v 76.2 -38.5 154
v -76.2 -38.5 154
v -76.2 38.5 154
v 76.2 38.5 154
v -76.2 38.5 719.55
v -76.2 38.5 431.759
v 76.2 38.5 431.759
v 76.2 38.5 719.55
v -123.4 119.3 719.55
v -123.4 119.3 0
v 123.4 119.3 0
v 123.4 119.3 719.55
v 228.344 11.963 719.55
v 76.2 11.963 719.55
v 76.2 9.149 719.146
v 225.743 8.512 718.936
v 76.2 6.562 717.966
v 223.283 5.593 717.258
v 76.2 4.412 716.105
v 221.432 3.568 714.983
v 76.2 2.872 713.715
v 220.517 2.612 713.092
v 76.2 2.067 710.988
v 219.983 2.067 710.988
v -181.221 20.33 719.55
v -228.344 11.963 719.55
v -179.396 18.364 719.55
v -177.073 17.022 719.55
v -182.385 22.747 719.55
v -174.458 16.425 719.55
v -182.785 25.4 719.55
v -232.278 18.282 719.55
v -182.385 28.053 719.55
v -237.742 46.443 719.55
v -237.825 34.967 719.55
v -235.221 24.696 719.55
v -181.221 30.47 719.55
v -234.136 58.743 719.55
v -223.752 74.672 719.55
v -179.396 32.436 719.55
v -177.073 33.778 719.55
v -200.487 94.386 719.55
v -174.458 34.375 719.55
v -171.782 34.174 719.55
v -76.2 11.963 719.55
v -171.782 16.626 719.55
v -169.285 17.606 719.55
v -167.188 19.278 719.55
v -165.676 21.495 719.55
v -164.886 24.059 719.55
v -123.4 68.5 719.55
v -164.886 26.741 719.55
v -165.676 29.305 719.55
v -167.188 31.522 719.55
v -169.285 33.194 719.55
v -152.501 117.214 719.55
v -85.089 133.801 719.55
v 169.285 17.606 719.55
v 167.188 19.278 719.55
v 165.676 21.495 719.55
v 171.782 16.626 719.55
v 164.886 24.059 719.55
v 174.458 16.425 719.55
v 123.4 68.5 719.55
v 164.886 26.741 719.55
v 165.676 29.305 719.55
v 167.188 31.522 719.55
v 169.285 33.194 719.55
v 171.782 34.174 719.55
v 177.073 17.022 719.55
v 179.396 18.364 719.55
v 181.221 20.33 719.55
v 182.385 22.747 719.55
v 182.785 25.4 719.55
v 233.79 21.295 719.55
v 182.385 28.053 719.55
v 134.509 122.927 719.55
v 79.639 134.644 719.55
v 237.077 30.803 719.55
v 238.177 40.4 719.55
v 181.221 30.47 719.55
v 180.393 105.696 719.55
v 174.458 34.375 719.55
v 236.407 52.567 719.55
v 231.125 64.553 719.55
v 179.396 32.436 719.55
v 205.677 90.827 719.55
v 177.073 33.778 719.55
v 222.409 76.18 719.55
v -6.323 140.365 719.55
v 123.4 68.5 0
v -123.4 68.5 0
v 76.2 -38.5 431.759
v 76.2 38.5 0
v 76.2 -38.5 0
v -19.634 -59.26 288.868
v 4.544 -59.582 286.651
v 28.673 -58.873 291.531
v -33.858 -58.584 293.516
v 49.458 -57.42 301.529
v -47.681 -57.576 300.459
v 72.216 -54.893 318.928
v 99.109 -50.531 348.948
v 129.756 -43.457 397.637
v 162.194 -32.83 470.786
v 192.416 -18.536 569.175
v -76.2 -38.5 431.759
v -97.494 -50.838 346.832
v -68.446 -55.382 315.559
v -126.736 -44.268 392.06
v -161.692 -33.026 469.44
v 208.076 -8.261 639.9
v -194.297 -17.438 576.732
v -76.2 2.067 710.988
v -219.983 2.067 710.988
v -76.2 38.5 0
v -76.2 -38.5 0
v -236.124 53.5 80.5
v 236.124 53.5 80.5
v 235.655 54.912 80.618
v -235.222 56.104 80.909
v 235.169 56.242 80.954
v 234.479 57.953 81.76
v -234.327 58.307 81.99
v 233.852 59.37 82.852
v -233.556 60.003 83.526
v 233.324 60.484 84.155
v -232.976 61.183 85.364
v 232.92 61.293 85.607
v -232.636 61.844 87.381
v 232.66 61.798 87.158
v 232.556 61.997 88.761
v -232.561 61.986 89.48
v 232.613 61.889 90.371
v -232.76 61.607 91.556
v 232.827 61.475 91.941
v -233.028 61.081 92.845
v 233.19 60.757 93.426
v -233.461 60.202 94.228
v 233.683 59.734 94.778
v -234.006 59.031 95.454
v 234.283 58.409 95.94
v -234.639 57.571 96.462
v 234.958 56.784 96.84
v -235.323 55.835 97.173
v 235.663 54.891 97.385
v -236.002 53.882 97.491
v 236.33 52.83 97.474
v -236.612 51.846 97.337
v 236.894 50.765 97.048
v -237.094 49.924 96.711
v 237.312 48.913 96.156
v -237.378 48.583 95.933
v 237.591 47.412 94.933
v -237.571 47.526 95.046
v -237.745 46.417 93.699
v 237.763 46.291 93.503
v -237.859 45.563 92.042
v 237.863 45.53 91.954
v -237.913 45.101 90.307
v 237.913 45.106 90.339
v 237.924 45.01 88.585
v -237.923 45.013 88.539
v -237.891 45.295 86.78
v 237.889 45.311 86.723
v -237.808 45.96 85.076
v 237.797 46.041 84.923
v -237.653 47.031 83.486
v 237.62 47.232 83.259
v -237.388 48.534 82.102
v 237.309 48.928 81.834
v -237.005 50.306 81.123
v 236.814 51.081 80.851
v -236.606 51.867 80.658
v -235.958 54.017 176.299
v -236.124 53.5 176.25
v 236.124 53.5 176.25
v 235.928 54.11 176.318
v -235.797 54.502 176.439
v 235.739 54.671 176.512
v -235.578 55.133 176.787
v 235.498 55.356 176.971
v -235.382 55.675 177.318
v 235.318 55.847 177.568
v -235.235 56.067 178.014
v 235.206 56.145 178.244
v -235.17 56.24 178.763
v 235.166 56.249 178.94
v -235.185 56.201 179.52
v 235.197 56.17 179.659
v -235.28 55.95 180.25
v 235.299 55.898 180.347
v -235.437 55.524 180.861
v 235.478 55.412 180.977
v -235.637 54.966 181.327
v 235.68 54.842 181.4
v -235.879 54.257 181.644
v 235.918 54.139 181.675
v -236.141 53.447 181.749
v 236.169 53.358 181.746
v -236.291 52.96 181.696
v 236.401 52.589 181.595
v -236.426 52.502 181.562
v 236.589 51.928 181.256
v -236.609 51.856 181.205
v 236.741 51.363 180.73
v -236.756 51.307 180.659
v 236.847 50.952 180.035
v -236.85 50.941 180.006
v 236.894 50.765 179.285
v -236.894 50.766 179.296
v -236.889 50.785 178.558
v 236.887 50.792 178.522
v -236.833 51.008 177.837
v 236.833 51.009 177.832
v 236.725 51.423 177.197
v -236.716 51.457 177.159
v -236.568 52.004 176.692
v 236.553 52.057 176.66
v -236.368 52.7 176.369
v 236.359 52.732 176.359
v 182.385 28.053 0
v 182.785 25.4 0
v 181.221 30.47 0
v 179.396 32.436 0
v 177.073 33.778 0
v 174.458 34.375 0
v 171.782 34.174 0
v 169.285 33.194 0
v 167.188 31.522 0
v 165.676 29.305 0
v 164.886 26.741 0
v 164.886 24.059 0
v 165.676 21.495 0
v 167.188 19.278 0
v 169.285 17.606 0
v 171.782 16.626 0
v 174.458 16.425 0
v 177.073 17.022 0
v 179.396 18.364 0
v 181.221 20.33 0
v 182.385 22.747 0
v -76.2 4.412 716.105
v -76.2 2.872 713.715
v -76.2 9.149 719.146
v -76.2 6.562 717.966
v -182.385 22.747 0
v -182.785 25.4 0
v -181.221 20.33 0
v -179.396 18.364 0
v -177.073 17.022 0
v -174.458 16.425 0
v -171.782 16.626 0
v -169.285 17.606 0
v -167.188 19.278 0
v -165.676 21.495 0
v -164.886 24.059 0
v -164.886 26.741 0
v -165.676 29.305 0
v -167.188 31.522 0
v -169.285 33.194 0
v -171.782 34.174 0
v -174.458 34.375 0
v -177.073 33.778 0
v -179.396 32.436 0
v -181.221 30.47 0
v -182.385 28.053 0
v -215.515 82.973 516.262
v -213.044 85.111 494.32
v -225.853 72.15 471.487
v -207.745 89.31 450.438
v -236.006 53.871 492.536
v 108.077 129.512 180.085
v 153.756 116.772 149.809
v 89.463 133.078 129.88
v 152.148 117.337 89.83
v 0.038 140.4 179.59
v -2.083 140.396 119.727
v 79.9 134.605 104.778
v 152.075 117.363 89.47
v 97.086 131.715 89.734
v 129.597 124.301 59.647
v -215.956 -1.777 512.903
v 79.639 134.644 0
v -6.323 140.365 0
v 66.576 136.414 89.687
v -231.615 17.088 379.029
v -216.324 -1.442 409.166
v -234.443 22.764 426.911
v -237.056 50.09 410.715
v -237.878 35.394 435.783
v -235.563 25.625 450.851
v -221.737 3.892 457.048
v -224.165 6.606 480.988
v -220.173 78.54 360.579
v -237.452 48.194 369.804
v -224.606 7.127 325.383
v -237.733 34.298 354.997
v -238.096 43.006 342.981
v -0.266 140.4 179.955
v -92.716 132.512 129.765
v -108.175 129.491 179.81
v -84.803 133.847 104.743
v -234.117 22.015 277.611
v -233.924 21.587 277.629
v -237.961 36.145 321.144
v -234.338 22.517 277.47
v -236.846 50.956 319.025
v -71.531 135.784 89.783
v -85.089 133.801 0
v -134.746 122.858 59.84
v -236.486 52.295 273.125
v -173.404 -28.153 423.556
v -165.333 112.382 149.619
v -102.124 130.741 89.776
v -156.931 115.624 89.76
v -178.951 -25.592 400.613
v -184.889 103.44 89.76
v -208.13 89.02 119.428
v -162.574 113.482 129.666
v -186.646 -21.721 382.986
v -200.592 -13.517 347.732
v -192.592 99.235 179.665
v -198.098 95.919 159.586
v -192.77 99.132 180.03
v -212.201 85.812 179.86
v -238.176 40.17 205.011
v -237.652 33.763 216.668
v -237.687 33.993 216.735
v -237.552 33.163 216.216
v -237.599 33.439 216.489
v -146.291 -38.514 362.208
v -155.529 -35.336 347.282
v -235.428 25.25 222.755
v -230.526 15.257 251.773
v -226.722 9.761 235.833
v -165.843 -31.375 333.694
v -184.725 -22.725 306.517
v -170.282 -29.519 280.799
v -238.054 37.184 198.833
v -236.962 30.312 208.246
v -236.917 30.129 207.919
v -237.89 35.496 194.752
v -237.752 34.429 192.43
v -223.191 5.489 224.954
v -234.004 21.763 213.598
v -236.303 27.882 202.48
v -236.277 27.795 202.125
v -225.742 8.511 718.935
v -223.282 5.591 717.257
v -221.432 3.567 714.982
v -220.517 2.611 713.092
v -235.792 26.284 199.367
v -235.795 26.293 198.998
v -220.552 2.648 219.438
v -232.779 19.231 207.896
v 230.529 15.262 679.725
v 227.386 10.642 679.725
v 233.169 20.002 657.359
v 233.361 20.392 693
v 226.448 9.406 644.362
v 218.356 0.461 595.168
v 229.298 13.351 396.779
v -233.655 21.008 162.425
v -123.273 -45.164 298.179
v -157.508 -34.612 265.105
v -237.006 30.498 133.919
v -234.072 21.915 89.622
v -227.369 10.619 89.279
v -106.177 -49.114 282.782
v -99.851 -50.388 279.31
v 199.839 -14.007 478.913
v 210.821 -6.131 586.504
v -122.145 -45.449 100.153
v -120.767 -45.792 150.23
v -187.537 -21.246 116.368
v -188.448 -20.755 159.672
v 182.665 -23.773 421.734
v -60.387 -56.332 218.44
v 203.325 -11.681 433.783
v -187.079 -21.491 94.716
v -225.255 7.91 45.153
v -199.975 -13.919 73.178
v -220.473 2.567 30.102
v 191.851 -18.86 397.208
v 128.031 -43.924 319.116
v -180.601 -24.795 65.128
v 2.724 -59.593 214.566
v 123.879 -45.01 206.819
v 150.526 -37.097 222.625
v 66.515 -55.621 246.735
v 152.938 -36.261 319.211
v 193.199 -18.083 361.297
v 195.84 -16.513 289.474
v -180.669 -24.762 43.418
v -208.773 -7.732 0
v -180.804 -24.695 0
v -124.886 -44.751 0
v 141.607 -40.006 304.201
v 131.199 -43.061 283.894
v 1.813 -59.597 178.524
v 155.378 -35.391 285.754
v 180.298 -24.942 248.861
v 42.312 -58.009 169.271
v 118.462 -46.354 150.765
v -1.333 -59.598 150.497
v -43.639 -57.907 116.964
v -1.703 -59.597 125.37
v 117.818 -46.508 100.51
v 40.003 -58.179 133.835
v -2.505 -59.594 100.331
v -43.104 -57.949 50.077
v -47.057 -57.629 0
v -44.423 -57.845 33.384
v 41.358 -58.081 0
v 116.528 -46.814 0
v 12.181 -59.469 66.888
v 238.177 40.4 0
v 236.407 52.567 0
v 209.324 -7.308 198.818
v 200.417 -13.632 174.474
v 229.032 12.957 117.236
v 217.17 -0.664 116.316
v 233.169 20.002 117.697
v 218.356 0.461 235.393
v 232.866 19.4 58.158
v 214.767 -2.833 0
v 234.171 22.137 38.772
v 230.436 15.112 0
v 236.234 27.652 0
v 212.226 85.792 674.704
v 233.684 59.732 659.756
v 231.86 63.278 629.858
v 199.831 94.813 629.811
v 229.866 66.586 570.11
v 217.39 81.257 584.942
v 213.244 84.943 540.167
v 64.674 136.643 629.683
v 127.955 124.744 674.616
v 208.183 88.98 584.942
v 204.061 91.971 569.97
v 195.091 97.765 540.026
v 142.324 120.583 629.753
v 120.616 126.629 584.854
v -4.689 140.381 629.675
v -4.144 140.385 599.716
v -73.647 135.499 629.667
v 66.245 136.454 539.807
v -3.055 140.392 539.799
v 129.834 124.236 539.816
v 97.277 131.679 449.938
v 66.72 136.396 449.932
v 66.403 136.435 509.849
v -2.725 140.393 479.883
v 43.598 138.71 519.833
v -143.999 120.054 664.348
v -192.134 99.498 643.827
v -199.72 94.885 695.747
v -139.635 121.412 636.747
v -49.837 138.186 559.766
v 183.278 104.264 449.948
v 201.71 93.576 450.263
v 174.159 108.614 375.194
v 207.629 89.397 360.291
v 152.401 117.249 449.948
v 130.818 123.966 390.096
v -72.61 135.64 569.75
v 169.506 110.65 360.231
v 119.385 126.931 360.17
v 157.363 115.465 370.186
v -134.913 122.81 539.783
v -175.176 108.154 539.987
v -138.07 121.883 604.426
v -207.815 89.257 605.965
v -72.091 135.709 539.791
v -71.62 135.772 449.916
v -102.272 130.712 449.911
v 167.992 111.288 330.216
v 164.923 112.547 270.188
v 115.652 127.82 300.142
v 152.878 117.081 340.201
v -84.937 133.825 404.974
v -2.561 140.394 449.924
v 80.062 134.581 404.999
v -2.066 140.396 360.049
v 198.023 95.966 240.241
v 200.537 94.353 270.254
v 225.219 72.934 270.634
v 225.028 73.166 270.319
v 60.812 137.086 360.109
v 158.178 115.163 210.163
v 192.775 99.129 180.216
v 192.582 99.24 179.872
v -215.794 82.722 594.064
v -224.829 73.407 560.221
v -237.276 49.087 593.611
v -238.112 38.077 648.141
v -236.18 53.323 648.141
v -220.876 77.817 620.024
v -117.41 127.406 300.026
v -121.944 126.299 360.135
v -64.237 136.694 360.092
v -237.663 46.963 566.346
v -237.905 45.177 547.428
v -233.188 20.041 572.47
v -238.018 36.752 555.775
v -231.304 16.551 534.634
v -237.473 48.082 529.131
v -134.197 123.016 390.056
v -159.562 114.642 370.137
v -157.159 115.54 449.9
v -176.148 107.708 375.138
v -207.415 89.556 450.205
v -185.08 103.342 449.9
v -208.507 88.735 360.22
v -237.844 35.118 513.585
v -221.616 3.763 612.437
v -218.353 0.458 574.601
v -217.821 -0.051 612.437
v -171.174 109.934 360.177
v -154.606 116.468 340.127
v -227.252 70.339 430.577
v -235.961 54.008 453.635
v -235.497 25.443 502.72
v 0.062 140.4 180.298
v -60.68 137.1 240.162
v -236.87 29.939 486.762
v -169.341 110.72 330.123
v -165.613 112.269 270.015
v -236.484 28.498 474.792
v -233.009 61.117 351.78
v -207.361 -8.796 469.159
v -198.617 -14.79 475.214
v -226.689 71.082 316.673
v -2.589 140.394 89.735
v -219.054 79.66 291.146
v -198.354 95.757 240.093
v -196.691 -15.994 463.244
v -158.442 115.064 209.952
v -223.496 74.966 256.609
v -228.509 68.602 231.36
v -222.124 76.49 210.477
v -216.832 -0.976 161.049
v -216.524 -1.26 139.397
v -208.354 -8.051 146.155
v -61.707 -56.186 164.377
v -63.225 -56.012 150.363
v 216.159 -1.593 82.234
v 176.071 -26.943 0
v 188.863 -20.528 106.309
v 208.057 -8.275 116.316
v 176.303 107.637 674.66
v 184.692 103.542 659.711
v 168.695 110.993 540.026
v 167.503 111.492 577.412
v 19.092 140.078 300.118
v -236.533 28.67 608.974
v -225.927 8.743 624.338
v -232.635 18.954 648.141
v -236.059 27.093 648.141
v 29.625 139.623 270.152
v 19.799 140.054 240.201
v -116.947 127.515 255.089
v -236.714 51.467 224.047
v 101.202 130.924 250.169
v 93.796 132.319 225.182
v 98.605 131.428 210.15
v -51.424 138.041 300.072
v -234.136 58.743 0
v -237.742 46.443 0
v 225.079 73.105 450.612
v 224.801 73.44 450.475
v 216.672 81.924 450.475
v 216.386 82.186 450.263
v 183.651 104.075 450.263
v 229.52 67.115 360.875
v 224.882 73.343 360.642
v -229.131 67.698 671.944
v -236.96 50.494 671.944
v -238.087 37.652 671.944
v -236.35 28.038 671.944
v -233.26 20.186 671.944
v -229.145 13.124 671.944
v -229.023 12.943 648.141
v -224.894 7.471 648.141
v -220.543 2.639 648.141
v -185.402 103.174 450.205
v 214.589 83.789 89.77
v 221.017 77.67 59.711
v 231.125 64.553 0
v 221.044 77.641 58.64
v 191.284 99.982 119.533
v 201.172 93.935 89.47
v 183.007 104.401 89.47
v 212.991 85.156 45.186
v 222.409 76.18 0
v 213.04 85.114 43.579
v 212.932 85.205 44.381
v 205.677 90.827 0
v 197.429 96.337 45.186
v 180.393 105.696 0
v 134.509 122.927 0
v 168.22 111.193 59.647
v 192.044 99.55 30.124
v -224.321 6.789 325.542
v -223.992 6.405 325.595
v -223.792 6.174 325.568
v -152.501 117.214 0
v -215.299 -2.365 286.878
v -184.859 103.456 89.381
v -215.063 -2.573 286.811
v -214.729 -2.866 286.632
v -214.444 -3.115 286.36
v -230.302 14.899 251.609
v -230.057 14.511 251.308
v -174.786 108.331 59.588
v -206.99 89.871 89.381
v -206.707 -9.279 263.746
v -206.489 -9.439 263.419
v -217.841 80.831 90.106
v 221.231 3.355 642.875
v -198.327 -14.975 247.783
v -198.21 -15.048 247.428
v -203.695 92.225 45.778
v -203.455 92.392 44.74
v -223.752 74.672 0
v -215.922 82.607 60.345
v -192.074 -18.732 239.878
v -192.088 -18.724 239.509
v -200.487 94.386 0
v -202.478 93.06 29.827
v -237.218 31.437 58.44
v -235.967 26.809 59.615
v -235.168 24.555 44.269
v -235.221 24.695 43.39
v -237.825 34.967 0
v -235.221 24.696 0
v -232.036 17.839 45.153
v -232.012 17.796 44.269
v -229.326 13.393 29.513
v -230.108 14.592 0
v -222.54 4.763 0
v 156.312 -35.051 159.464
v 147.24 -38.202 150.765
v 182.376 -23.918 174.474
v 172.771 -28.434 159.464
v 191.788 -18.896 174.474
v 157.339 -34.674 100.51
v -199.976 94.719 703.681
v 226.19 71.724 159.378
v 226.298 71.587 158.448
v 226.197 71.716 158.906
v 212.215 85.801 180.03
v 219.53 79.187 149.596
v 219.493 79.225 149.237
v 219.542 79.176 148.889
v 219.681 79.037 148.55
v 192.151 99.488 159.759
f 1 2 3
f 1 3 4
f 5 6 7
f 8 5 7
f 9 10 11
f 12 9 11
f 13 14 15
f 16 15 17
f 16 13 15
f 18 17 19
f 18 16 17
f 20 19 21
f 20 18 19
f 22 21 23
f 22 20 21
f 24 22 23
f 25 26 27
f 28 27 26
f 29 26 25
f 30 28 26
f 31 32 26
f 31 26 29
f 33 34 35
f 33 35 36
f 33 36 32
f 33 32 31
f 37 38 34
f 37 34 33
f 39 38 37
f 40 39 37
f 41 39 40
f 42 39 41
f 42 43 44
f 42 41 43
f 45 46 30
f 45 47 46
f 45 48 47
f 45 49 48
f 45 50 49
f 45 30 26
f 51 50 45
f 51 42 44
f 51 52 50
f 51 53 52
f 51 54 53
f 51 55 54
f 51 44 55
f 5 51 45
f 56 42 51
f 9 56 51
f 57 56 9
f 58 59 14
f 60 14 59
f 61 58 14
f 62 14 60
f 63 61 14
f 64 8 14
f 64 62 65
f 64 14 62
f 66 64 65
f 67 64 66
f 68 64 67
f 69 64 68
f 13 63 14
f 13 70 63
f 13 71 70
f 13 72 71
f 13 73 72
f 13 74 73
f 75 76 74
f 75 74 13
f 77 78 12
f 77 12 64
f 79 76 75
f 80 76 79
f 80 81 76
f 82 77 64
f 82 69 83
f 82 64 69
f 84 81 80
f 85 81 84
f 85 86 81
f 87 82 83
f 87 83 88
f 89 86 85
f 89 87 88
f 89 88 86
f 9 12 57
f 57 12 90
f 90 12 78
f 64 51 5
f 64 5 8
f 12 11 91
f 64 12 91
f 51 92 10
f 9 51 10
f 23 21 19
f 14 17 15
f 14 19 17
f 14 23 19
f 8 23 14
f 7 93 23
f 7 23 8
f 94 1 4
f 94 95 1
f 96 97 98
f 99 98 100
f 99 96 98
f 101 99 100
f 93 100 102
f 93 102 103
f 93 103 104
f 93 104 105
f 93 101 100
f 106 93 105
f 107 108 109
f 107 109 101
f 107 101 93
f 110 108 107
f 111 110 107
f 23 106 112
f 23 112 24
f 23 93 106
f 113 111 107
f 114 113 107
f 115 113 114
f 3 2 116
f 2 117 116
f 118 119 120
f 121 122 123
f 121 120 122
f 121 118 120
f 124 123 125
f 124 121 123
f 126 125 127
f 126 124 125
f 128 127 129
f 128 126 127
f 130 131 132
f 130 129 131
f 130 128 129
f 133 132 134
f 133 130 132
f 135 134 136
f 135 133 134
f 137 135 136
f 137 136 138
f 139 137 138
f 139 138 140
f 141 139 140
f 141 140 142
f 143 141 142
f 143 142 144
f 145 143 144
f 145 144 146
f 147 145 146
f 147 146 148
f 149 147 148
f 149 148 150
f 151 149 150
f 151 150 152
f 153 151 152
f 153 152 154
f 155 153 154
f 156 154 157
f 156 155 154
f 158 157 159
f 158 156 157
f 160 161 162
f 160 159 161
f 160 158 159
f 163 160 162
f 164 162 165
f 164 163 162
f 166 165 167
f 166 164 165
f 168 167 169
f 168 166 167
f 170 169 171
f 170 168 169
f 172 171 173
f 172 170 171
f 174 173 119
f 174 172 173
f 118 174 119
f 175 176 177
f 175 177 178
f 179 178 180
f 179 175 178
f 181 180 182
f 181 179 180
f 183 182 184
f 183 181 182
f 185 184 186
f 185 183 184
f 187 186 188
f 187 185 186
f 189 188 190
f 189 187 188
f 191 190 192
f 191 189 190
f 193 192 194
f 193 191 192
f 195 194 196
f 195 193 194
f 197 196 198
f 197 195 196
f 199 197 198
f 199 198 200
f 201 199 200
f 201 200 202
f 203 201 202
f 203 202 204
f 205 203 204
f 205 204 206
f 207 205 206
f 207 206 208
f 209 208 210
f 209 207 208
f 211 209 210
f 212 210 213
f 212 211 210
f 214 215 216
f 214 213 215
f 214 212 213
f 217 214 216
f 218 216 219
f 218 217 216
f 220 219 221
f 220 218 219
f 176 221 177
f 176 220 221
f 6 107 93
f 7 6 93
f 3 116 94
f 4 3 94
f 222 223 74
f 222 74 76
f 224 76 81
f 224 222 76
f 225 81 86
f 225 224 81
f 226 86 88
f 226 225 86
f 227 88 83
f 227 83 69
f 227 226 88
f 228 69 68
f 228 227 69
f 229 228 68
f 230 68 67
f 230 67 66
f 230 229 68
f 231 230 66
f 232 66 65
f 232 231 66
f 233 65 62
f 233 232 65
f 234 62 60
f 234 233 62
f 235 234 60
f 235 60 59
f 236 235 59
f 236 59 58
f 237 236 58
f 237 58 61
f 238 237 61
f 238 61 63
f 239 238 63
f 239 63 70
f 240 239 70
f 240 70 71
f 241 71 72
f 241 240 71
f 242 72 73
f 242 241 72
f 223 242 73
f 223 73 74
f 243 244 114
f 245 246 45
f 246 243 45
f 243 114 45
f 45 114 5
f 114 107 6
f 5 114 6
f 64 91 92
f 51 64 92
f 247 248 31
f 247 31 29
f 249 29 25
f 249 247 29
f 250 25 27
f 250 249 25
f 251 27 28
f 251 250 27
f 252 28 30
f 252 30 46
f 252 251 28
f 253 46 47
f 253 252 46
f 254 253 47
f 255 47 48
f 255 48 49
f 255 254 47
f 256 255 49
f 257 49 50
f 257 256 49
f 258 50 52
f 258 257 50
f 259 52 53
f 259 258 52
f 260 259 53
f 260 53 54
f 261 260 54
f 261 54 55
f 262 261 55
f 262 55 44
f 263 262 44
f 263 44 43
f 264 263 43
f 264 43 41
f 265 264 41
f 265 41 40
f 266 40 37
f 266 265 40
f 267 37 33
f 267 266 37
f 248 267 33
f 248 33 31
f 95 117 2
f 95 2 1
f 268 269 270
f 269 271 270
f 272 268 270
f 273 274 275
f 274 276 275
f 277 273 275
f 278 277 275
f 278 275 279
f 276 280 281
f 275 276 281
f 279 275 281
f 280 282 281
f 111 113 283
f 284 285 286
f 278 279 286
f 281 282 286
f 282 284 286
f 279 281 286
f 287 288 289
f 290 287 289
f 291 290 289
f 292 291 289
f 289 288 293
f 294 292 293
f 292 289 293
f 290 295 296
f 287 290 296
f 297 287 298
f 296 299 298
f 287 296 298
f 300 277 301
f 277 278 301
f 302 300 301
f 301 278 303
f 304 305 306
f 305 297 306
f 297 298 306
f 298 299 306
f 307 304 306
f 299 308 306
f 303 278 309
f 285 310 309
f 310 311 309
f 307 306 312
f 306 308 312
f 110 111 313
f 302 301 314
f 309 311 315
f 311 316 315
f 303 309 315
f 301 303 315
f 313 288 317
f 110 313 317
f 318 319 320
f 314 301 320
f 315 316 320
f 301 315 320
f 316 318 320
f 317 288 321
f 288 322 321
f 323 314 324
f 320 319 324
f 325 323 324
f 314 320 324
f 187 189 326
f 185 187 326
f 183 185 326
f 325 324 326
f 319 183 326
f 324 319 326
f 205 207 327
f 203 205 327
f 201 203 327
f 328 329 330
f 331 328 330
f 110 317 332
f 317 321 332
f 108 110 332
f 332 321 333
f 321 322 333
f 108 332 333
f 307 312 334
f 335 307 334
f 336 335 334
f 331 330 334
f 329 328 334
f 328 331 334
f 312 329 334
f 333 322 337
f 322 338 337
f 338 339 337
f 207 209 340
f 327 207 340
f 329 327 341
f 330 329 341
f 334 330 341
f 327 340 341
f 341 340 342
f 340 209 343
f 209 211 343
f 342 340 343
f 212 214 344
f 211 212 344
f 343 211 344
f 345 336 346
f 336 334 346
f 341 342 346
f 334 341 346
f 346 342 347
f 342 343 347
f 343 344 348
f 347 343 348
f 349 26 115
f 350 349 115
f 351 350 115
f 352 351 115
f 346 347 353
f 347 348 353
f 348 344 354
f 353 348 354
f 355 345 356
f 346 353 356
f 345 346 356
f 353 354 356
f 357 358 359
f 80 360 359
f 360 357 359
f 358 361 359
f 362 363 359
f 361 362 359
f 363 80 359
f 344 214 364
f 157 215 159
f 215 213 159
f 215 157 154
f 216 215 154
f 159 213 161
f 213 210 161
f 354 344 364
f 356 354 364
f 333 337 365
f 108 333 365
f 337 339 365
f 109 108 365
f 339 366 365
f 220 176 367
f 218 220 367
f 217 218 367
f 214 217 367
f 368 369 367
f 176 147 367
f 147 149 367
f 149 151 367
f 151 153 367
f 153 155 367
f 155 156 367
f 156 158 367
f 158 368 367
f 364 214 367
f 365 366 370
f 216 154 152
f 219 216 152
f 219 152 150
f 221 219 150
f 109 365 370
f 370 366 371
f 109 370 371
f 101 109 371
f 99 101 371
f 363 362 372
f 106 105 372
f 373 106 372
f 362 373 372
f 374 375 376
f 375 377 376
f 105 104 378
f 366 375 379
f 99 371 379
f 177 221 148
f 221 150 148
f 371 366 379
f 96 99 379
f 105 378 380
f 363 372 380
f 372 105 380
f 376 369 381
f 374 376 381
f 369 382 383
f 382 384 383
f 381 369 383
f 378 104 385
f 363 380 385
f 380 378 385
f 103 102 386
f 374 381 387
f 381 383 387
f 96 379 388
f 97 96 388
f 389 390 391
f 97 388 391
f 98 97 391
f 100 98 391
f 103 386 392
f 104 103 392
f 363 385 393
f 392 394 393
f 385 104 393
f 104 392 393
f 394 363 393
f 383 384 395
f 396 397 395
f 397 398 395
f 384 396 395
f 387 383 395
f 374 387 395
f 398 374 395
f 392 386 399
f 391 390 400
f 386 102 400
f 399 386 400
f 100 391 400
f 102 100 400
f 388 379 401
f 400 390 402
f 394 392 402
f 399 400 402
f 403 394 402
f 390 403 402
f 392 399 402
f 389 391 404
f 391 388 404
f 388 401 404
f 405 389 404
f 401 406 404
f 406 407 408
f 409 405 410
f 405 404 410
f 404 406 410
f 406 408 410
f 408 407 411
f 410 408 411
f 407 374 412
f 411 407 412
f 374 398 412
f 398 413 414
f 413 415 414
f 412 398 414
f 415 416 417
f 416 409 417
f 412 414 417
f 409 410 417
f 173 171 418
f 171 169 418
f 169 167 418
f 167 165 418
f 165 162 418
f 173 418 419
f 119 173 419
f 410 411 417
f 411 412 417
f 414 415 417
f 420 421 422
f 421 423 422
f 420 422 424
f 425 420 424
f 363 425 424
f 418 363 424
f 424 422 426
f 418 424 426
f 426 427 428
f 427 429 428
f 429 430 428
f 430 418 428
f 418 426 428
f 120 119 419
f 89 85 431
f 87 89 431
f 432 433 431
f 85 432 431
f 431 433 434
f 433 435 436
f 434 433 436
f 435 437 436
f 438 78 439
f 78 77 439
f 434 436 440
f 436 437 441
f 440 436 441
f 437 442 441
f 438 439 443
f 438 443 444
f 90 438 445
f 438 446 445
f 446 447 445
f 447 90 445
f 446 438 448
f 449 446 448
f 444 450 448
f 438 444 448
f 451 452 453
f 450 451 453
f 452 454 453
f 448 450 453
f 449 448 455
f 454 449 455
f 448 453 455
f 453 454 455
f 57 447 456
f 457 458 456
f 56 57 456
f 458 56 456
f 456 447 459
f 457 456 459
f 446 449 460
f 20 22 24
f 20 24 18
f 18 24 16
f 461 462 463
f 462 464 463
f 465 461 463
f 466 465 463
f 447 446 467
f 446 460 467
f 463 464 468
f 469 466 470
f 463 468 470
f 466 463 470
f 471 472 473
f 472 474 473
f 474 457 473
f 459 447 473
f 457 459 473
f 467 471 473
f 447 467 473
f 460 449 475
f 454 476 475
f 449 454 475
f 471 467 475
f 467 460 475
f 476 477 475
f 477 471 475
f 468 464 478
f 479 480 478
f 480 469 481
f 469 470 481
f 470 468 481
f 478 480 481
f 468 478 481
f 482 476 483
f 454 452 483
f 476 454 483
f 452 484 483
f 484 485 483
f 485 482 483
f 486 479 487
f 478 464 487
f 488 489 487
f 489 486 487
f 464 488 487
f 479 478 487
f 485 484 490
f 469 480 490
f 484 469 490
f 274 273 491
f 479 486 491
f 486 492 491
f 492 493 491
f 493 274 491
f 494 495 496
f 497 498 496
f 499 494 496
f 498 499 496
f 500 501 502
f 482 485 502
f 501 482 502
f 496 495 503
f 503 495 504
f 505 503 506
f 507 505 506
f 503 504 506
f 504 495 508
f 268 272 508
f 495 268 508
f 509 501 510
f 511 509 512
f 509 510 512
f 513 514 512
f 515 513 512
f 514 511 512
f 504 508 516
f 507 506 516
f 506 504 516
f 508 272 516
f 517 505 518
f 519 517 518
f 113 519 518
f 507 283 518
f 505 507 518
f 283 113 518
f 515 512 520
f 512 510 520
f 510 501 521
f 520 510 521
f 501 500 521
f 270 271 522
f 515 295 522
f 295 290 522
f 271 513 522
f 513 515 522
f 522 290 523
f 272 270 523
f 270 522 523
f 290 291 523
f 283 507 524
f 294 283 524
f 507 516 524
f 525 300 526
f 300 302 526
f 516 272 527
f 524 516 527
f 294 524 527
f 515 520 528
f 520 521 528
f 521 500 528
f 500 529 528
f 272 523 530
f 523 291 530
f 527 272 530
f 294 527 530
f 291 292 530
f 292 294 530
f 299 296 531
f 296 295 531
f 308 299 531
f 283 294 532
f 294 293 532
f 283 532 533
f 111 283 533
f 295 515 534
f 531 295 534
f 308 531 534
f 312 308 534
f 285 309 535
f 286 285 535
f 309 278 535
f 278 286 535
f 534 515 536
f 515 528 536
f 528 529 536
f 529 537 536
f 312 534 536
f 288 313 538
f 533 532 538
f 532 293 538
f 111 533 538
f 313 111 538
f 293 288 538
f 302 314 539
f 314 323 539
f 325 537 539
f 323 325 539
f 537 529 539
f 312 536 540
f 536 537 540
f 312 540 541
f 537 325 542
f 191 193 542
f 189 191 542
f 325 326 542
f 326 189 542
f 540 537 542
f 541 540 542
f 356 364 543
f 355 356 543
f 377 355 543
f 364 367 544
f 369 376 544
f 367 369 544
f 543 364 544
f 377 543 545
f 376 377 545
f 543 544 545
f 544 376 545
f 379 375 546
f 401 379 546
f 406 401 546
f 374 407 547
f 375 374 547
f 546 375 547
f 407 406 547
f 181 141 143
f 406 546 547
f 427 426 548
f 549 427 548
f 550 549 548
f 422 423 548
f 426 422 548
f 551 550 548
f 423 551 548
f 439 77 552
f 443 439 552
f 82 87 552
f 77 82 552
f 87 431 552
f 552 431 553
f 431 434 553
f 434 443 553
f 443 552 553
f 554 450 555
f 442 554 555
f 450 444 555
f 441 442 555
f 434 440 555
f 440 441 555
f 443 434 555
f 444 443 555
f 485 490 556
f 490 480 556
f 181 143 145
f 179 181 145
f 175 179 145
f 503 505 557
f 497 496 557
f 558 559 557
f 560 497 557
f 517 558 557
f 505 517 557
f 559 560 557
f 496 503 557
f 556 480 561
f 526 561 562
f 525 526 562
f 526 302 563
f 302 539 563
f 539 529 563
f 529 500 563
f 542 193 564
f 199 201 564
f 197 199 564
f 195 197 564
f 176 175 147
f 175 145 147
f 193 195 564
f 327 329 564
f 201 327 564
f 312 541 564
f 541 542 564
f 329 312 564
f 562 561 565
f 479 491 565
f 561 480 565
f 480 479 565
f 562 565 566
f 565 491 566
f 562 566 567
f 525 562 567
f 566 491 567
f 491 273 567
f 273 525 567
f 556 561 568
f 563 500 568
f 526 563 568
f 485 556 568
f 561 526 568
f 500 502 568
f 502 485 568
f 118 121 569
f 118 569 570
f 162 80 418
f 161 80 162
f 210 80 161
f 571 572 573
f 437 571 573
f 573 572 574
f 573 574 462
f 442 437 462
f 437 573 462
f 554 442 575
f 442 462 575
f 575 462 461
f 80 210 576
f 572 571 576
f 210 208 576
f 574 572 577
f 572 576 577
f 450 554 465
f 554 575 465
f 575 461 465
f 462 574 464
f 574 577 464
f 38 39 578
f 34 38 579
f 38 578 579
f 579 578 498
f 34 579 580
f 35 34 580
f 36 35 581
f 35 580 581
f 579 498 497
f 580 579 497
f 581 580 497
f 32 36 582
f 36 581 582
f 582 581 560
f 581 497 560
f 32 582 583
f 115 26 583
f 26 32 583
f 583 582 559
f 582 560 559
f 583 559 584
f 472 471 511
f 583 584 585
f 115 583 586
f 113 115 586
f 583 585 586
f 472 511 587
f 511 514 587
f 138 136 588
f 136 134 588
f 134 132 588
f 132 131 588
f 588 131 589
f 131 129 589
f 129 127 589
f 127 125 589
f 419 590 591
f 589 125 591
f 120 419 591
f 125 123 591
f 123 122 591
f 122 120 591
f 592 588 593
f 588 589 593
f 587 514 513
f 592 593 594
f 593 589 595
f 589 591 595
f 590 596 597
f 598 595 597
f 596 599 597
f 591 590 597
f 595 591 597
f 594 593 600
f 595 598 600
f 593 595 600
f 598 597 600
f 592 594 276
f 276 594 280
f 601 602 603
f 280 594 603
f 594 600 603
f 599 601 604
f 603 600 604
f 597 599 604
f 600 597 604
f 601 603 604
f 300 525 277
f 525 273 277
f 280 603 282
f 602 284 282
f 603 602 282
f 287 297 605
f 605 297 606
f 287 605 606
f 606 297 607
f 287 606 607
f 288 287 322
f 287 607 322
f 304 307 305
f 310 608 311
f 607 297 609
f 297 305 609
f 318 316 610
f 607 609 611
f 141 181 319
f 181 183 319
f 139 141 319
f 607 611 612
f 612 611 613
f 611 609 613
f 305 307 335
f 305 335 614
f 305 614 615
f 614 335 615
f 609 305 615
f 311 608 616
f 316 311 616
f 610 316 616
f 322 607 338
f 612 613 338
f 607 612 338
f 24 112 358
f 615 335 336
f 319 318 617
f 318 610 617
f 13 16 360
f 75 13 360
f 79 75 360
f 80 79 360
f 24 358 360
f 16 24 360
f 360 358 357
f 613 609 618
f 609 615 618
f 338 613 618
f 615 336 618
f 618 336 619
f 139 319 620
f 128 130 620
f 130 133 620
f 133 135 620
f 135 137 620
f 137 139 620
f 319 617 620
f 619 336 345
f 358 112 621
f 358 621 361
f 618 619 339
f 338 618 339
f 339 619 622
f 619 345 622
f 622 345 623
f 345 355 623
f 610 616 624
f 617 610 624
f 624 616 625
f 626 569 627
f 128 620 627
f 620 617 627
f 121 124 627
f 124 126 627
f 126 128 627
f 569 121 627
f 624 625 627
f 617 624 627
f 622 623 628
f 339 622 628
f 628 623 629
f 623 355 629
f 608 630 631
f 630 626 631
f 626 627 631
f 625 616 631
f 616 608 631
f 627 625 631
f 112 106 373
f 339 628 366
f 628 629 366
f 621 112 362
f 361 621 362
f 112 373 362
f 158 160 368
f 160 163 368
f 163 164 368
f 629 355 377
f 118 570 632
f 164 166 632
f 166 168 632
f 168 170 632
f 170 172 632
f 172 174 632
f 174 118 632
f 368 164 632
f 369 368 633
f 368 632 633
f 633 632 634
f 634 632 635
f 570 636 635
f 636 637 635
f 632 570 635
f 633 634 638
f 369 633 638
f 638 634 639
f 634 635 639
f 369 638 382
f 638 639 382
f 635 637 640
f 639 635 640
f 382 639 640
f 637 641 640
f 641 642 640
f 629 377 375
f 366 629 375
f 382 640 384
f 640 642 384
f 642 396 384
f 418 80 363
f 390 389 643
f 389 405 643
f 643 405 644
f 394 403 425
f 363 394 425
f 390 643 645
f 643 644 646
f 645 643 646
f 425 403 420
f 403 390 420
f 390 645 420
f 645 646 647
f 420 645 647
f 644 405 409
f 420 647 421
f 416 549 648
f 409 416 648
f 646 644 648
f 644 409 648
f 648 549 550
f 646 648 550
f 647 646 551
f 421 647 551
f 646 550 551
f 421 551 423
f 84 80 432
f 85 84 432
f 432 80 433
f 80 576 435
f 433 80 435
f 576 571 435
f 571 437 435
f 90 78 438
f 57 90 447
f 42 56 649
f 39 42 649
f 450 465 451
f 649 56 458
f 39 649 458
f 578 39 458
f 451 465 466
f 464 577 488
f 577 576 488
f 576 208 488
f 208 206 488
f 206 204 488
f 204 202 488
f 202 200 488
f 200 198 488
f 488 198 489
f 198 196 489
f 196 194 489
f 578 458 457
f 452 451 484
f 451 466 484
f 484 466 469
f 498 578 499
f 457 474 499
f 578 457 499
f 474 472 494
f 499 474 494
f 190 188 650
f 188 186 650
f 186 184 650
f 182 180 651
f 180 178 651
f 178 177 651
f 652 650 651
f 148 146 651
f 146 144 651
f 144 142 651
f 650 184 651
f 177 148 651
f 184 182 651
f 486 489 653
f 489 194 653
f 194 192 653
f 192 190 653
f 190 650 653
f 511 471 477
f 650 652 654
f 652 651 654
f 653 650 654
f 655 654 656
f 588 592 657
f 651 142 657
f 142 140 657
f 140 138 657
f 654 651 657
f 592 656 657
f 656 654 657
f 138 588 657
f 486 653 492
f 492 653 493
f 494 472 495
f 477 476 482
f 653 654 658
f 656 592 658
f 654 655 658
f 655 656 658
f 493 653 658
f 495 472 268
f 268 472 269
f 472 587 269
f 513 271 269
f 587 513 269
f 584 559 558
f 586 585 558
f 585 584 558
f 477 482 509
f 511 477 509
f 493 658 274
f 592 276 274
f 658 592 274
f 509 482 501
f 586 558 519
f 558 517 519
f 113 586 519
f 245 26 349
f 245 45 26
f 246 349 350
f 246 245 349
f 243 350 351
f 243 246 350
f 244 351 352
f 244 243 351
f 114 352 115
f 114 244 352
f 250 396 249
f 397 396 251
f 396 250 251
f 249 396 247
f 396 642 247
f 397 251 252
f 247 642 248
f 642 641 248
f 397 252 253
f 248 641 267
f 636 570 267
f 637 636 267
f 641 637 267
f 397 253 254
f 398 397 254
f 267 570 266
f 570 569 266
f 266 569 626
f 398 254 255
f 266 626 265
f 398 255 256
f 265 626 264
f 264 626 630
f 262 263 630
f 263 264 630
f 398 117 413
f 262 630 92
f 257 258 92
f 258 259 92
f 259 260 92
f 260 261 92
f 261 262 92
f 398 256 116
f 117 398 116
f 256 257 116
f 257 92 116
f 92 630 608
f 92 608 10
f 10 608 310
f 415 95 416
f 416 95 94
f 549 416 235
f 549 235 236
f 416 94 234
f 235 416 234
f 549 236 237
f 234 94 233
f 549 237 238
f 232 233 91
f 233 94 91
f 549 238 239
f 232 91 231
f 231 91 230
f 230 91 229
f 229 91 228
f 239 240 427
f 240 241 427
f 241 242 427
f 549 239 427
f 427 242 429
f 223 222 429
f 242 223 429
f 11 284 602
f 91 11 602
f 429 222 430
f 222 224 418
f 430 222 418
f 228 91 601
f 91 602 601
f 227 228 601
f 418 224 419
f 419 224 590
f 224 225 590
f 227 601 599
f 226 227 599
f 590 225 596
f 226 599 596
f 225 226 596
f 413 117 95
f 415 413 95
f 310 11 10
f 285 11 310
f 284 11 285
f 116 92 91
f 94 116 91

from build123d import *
from OCP.BRepAlgoAPI import BRepAlgoAPI_Cut
from OCP.TopTools import TopTools_ListOfShape

# Parameters (mm, degrees)
SKETCH1_RX              = 238.176778745998
SKETCH1_RY              = 100
SKETCH1_R               = 9.000000000000009
SKETCH1_W               = 152.4
SKETCH1_H               = 77
BOSS_EXTRUDE1_DEPTH     = 719.5500000000001
CUT_EXTRUDE1_DEPTH      = 771.8388550363948
CUT_EXTRUDE1_DEPTH_BACK = 771.8388550363948
FILLET1_R               = 9.999999999999996
BOSS_EXTRUDE2_REACH     = 780.772
SKETCH4_W               = 152.4
SKETCH4_H               = 277.7592603894774
CUT_EXTRUDE2_DEPTH      = 771.8388551788538
CUT_EXTRUDE2_DEPTH_BACK = 771.8388551788538
SKETCH5_R               = 2.7500000000000084
SKETCH5_R_2             = 8.50000000000001


with BuildPart() as part:
    # Sketch1 → Boss-Extrude1 (new body)
    with BuildSketch(Plane.XY):
        with Locations(Location((0, 40.399999999999984), (0, 0, 6.84e-15))):
            Ellipse(SKETCH1_RX, SKETCH1_RY)
        with Locations((173.785, 25.400000000000006)):
            Circle(SKETCH1_R, mode=Mode.SUBTRACT)
        with Locations((-173.785, 25.400000000000006)):
            Circle(SKETCH1_R, mode=Mode.SUBTRACT)
        Polygon((-123.39999999999999, 119.29999999999997), (123.39999999999999, 119.3), (123.4, 68.5), (-123.4, 68.49999999999997), align=None, mode=Mode.SUBTRACT)
        Rectangle(SKETCH1_W, SKETCH1_H, mode=Mode.SUBTRACT)
    extrude(amount=BOSS_EXTRUDE1_DEPTH)

    # Sketch3 → Cut-Extrude1 (cut, two sides: drawn at the far end of the back side and taken through both)
    with BuildSketch(Plane(origin=(0, 0, 0), x_dir=(0, 0, -1), z_dir=(1, 0, 0)).offset(-CUT_EXTRUDE1_DEPTH_BACK)):
        Polygon((1280.4819340937215, -287.25956976454023), (-201.17484480506153, -72.00000000000001), (-731.1748448050615, 4.999999999999994), (-2212.831623703845, 220.2595697645402), (-2643.350763232925, -2743.053988033026), (849.9627945646412, -3250.5731275621065), align=None)
    extrude(amount=CUT_EXTRUDE1_DEPTH + CUT_EXTRUDE1_DEPTH_BACK, mode=Mode.SUBTRACT)

    # Fillet1
    fillet1_edges = [part.edges().sort_by_distance(p)[0] for p in [
        (148.69467604524613, 3.311107452849548, 719.5500000000004),
        (-148.69467604524613, 3.311107452849548, 719.5500000000004),
    ]]
    fillet(fillet1_edges, radius=FILLET1_R)

    # Sketch4 → Boss-Extrude2 (add, up to next)
    with BuildSketch(Plane(origin=(0, -38.5, 0), x_dir=(1, 0, 0), z_dir=(0, 1, 0)), mode=Mode.PRIVATE) as boss_extrude2_sk1:
        with Locations((0, -292.8796301947387)):
            Rectangle(SKETCH4_W, SKETCH4_H)
    boss_extrude2_tool1 = extrude(boss_extrude2_sk1.sketch, amount=BOSS_EXTRUDE2_REACH, mode=Mode.PRIVATE) - part.part
    add(boss_extrude2_tool1.solids().sort_by_distance((0, -38.5, 292.87963))[0])


with BuildPart() as cut_extrude2_tool:
    # Sketch5 → Cut-Extrude2 (new, two sides: drawn at the far end of the back side and taken through both)
    with BuildSketch(Plane(origin=(0, 0, 0), x_dir=(0, 0, -1), z_dir=(1, 0, 0)).offset(-CUT_EXTRUDE2_DEPTH_BACK)):
        with Locations((-179.00000000000003, 53.5)):
            Circle(SKETCH5_R)
        with Locations((-89.00000000000003, 53.5)):
            Circle(SKETCH5_R_2)
    extrude(amount=CUT_EXTRUDE2_DEPTH + CUT_EXTRUDE2_DEPTH_BACK)


with BuildPart() as part_1:
    add(part.part)

    # Cut-Extrude2: cut by cut_extrude2_tool, with a tolerance
    cut_extrude2_stock = TopTools_ListOfShape()
    cut_extrude2_stock.Append(part_1.part.wrapped)
    cut_extrude2_tools = TopTools_ListOfShape()
    cut_extrude2_tools.Append(cut_extrude2_tool.part.wrapped)
    cut_extrude2_cut = BRepAlgoAPI_Cut()
    cut_extrude2_cut.SetArguments(cut_extrude2_stock)
    cut_extrude2_cut.SetTools(cut_extrude2_tools)
    cut_extrude2_cut.SetFuzzyValue(0.00001)
    cut_extrude2_cut.Build()
    add(Compound.cast(cut_extrude2_cut.Shape()).solids(), mode=Mode.REPLACE)


solid = part_1.part
